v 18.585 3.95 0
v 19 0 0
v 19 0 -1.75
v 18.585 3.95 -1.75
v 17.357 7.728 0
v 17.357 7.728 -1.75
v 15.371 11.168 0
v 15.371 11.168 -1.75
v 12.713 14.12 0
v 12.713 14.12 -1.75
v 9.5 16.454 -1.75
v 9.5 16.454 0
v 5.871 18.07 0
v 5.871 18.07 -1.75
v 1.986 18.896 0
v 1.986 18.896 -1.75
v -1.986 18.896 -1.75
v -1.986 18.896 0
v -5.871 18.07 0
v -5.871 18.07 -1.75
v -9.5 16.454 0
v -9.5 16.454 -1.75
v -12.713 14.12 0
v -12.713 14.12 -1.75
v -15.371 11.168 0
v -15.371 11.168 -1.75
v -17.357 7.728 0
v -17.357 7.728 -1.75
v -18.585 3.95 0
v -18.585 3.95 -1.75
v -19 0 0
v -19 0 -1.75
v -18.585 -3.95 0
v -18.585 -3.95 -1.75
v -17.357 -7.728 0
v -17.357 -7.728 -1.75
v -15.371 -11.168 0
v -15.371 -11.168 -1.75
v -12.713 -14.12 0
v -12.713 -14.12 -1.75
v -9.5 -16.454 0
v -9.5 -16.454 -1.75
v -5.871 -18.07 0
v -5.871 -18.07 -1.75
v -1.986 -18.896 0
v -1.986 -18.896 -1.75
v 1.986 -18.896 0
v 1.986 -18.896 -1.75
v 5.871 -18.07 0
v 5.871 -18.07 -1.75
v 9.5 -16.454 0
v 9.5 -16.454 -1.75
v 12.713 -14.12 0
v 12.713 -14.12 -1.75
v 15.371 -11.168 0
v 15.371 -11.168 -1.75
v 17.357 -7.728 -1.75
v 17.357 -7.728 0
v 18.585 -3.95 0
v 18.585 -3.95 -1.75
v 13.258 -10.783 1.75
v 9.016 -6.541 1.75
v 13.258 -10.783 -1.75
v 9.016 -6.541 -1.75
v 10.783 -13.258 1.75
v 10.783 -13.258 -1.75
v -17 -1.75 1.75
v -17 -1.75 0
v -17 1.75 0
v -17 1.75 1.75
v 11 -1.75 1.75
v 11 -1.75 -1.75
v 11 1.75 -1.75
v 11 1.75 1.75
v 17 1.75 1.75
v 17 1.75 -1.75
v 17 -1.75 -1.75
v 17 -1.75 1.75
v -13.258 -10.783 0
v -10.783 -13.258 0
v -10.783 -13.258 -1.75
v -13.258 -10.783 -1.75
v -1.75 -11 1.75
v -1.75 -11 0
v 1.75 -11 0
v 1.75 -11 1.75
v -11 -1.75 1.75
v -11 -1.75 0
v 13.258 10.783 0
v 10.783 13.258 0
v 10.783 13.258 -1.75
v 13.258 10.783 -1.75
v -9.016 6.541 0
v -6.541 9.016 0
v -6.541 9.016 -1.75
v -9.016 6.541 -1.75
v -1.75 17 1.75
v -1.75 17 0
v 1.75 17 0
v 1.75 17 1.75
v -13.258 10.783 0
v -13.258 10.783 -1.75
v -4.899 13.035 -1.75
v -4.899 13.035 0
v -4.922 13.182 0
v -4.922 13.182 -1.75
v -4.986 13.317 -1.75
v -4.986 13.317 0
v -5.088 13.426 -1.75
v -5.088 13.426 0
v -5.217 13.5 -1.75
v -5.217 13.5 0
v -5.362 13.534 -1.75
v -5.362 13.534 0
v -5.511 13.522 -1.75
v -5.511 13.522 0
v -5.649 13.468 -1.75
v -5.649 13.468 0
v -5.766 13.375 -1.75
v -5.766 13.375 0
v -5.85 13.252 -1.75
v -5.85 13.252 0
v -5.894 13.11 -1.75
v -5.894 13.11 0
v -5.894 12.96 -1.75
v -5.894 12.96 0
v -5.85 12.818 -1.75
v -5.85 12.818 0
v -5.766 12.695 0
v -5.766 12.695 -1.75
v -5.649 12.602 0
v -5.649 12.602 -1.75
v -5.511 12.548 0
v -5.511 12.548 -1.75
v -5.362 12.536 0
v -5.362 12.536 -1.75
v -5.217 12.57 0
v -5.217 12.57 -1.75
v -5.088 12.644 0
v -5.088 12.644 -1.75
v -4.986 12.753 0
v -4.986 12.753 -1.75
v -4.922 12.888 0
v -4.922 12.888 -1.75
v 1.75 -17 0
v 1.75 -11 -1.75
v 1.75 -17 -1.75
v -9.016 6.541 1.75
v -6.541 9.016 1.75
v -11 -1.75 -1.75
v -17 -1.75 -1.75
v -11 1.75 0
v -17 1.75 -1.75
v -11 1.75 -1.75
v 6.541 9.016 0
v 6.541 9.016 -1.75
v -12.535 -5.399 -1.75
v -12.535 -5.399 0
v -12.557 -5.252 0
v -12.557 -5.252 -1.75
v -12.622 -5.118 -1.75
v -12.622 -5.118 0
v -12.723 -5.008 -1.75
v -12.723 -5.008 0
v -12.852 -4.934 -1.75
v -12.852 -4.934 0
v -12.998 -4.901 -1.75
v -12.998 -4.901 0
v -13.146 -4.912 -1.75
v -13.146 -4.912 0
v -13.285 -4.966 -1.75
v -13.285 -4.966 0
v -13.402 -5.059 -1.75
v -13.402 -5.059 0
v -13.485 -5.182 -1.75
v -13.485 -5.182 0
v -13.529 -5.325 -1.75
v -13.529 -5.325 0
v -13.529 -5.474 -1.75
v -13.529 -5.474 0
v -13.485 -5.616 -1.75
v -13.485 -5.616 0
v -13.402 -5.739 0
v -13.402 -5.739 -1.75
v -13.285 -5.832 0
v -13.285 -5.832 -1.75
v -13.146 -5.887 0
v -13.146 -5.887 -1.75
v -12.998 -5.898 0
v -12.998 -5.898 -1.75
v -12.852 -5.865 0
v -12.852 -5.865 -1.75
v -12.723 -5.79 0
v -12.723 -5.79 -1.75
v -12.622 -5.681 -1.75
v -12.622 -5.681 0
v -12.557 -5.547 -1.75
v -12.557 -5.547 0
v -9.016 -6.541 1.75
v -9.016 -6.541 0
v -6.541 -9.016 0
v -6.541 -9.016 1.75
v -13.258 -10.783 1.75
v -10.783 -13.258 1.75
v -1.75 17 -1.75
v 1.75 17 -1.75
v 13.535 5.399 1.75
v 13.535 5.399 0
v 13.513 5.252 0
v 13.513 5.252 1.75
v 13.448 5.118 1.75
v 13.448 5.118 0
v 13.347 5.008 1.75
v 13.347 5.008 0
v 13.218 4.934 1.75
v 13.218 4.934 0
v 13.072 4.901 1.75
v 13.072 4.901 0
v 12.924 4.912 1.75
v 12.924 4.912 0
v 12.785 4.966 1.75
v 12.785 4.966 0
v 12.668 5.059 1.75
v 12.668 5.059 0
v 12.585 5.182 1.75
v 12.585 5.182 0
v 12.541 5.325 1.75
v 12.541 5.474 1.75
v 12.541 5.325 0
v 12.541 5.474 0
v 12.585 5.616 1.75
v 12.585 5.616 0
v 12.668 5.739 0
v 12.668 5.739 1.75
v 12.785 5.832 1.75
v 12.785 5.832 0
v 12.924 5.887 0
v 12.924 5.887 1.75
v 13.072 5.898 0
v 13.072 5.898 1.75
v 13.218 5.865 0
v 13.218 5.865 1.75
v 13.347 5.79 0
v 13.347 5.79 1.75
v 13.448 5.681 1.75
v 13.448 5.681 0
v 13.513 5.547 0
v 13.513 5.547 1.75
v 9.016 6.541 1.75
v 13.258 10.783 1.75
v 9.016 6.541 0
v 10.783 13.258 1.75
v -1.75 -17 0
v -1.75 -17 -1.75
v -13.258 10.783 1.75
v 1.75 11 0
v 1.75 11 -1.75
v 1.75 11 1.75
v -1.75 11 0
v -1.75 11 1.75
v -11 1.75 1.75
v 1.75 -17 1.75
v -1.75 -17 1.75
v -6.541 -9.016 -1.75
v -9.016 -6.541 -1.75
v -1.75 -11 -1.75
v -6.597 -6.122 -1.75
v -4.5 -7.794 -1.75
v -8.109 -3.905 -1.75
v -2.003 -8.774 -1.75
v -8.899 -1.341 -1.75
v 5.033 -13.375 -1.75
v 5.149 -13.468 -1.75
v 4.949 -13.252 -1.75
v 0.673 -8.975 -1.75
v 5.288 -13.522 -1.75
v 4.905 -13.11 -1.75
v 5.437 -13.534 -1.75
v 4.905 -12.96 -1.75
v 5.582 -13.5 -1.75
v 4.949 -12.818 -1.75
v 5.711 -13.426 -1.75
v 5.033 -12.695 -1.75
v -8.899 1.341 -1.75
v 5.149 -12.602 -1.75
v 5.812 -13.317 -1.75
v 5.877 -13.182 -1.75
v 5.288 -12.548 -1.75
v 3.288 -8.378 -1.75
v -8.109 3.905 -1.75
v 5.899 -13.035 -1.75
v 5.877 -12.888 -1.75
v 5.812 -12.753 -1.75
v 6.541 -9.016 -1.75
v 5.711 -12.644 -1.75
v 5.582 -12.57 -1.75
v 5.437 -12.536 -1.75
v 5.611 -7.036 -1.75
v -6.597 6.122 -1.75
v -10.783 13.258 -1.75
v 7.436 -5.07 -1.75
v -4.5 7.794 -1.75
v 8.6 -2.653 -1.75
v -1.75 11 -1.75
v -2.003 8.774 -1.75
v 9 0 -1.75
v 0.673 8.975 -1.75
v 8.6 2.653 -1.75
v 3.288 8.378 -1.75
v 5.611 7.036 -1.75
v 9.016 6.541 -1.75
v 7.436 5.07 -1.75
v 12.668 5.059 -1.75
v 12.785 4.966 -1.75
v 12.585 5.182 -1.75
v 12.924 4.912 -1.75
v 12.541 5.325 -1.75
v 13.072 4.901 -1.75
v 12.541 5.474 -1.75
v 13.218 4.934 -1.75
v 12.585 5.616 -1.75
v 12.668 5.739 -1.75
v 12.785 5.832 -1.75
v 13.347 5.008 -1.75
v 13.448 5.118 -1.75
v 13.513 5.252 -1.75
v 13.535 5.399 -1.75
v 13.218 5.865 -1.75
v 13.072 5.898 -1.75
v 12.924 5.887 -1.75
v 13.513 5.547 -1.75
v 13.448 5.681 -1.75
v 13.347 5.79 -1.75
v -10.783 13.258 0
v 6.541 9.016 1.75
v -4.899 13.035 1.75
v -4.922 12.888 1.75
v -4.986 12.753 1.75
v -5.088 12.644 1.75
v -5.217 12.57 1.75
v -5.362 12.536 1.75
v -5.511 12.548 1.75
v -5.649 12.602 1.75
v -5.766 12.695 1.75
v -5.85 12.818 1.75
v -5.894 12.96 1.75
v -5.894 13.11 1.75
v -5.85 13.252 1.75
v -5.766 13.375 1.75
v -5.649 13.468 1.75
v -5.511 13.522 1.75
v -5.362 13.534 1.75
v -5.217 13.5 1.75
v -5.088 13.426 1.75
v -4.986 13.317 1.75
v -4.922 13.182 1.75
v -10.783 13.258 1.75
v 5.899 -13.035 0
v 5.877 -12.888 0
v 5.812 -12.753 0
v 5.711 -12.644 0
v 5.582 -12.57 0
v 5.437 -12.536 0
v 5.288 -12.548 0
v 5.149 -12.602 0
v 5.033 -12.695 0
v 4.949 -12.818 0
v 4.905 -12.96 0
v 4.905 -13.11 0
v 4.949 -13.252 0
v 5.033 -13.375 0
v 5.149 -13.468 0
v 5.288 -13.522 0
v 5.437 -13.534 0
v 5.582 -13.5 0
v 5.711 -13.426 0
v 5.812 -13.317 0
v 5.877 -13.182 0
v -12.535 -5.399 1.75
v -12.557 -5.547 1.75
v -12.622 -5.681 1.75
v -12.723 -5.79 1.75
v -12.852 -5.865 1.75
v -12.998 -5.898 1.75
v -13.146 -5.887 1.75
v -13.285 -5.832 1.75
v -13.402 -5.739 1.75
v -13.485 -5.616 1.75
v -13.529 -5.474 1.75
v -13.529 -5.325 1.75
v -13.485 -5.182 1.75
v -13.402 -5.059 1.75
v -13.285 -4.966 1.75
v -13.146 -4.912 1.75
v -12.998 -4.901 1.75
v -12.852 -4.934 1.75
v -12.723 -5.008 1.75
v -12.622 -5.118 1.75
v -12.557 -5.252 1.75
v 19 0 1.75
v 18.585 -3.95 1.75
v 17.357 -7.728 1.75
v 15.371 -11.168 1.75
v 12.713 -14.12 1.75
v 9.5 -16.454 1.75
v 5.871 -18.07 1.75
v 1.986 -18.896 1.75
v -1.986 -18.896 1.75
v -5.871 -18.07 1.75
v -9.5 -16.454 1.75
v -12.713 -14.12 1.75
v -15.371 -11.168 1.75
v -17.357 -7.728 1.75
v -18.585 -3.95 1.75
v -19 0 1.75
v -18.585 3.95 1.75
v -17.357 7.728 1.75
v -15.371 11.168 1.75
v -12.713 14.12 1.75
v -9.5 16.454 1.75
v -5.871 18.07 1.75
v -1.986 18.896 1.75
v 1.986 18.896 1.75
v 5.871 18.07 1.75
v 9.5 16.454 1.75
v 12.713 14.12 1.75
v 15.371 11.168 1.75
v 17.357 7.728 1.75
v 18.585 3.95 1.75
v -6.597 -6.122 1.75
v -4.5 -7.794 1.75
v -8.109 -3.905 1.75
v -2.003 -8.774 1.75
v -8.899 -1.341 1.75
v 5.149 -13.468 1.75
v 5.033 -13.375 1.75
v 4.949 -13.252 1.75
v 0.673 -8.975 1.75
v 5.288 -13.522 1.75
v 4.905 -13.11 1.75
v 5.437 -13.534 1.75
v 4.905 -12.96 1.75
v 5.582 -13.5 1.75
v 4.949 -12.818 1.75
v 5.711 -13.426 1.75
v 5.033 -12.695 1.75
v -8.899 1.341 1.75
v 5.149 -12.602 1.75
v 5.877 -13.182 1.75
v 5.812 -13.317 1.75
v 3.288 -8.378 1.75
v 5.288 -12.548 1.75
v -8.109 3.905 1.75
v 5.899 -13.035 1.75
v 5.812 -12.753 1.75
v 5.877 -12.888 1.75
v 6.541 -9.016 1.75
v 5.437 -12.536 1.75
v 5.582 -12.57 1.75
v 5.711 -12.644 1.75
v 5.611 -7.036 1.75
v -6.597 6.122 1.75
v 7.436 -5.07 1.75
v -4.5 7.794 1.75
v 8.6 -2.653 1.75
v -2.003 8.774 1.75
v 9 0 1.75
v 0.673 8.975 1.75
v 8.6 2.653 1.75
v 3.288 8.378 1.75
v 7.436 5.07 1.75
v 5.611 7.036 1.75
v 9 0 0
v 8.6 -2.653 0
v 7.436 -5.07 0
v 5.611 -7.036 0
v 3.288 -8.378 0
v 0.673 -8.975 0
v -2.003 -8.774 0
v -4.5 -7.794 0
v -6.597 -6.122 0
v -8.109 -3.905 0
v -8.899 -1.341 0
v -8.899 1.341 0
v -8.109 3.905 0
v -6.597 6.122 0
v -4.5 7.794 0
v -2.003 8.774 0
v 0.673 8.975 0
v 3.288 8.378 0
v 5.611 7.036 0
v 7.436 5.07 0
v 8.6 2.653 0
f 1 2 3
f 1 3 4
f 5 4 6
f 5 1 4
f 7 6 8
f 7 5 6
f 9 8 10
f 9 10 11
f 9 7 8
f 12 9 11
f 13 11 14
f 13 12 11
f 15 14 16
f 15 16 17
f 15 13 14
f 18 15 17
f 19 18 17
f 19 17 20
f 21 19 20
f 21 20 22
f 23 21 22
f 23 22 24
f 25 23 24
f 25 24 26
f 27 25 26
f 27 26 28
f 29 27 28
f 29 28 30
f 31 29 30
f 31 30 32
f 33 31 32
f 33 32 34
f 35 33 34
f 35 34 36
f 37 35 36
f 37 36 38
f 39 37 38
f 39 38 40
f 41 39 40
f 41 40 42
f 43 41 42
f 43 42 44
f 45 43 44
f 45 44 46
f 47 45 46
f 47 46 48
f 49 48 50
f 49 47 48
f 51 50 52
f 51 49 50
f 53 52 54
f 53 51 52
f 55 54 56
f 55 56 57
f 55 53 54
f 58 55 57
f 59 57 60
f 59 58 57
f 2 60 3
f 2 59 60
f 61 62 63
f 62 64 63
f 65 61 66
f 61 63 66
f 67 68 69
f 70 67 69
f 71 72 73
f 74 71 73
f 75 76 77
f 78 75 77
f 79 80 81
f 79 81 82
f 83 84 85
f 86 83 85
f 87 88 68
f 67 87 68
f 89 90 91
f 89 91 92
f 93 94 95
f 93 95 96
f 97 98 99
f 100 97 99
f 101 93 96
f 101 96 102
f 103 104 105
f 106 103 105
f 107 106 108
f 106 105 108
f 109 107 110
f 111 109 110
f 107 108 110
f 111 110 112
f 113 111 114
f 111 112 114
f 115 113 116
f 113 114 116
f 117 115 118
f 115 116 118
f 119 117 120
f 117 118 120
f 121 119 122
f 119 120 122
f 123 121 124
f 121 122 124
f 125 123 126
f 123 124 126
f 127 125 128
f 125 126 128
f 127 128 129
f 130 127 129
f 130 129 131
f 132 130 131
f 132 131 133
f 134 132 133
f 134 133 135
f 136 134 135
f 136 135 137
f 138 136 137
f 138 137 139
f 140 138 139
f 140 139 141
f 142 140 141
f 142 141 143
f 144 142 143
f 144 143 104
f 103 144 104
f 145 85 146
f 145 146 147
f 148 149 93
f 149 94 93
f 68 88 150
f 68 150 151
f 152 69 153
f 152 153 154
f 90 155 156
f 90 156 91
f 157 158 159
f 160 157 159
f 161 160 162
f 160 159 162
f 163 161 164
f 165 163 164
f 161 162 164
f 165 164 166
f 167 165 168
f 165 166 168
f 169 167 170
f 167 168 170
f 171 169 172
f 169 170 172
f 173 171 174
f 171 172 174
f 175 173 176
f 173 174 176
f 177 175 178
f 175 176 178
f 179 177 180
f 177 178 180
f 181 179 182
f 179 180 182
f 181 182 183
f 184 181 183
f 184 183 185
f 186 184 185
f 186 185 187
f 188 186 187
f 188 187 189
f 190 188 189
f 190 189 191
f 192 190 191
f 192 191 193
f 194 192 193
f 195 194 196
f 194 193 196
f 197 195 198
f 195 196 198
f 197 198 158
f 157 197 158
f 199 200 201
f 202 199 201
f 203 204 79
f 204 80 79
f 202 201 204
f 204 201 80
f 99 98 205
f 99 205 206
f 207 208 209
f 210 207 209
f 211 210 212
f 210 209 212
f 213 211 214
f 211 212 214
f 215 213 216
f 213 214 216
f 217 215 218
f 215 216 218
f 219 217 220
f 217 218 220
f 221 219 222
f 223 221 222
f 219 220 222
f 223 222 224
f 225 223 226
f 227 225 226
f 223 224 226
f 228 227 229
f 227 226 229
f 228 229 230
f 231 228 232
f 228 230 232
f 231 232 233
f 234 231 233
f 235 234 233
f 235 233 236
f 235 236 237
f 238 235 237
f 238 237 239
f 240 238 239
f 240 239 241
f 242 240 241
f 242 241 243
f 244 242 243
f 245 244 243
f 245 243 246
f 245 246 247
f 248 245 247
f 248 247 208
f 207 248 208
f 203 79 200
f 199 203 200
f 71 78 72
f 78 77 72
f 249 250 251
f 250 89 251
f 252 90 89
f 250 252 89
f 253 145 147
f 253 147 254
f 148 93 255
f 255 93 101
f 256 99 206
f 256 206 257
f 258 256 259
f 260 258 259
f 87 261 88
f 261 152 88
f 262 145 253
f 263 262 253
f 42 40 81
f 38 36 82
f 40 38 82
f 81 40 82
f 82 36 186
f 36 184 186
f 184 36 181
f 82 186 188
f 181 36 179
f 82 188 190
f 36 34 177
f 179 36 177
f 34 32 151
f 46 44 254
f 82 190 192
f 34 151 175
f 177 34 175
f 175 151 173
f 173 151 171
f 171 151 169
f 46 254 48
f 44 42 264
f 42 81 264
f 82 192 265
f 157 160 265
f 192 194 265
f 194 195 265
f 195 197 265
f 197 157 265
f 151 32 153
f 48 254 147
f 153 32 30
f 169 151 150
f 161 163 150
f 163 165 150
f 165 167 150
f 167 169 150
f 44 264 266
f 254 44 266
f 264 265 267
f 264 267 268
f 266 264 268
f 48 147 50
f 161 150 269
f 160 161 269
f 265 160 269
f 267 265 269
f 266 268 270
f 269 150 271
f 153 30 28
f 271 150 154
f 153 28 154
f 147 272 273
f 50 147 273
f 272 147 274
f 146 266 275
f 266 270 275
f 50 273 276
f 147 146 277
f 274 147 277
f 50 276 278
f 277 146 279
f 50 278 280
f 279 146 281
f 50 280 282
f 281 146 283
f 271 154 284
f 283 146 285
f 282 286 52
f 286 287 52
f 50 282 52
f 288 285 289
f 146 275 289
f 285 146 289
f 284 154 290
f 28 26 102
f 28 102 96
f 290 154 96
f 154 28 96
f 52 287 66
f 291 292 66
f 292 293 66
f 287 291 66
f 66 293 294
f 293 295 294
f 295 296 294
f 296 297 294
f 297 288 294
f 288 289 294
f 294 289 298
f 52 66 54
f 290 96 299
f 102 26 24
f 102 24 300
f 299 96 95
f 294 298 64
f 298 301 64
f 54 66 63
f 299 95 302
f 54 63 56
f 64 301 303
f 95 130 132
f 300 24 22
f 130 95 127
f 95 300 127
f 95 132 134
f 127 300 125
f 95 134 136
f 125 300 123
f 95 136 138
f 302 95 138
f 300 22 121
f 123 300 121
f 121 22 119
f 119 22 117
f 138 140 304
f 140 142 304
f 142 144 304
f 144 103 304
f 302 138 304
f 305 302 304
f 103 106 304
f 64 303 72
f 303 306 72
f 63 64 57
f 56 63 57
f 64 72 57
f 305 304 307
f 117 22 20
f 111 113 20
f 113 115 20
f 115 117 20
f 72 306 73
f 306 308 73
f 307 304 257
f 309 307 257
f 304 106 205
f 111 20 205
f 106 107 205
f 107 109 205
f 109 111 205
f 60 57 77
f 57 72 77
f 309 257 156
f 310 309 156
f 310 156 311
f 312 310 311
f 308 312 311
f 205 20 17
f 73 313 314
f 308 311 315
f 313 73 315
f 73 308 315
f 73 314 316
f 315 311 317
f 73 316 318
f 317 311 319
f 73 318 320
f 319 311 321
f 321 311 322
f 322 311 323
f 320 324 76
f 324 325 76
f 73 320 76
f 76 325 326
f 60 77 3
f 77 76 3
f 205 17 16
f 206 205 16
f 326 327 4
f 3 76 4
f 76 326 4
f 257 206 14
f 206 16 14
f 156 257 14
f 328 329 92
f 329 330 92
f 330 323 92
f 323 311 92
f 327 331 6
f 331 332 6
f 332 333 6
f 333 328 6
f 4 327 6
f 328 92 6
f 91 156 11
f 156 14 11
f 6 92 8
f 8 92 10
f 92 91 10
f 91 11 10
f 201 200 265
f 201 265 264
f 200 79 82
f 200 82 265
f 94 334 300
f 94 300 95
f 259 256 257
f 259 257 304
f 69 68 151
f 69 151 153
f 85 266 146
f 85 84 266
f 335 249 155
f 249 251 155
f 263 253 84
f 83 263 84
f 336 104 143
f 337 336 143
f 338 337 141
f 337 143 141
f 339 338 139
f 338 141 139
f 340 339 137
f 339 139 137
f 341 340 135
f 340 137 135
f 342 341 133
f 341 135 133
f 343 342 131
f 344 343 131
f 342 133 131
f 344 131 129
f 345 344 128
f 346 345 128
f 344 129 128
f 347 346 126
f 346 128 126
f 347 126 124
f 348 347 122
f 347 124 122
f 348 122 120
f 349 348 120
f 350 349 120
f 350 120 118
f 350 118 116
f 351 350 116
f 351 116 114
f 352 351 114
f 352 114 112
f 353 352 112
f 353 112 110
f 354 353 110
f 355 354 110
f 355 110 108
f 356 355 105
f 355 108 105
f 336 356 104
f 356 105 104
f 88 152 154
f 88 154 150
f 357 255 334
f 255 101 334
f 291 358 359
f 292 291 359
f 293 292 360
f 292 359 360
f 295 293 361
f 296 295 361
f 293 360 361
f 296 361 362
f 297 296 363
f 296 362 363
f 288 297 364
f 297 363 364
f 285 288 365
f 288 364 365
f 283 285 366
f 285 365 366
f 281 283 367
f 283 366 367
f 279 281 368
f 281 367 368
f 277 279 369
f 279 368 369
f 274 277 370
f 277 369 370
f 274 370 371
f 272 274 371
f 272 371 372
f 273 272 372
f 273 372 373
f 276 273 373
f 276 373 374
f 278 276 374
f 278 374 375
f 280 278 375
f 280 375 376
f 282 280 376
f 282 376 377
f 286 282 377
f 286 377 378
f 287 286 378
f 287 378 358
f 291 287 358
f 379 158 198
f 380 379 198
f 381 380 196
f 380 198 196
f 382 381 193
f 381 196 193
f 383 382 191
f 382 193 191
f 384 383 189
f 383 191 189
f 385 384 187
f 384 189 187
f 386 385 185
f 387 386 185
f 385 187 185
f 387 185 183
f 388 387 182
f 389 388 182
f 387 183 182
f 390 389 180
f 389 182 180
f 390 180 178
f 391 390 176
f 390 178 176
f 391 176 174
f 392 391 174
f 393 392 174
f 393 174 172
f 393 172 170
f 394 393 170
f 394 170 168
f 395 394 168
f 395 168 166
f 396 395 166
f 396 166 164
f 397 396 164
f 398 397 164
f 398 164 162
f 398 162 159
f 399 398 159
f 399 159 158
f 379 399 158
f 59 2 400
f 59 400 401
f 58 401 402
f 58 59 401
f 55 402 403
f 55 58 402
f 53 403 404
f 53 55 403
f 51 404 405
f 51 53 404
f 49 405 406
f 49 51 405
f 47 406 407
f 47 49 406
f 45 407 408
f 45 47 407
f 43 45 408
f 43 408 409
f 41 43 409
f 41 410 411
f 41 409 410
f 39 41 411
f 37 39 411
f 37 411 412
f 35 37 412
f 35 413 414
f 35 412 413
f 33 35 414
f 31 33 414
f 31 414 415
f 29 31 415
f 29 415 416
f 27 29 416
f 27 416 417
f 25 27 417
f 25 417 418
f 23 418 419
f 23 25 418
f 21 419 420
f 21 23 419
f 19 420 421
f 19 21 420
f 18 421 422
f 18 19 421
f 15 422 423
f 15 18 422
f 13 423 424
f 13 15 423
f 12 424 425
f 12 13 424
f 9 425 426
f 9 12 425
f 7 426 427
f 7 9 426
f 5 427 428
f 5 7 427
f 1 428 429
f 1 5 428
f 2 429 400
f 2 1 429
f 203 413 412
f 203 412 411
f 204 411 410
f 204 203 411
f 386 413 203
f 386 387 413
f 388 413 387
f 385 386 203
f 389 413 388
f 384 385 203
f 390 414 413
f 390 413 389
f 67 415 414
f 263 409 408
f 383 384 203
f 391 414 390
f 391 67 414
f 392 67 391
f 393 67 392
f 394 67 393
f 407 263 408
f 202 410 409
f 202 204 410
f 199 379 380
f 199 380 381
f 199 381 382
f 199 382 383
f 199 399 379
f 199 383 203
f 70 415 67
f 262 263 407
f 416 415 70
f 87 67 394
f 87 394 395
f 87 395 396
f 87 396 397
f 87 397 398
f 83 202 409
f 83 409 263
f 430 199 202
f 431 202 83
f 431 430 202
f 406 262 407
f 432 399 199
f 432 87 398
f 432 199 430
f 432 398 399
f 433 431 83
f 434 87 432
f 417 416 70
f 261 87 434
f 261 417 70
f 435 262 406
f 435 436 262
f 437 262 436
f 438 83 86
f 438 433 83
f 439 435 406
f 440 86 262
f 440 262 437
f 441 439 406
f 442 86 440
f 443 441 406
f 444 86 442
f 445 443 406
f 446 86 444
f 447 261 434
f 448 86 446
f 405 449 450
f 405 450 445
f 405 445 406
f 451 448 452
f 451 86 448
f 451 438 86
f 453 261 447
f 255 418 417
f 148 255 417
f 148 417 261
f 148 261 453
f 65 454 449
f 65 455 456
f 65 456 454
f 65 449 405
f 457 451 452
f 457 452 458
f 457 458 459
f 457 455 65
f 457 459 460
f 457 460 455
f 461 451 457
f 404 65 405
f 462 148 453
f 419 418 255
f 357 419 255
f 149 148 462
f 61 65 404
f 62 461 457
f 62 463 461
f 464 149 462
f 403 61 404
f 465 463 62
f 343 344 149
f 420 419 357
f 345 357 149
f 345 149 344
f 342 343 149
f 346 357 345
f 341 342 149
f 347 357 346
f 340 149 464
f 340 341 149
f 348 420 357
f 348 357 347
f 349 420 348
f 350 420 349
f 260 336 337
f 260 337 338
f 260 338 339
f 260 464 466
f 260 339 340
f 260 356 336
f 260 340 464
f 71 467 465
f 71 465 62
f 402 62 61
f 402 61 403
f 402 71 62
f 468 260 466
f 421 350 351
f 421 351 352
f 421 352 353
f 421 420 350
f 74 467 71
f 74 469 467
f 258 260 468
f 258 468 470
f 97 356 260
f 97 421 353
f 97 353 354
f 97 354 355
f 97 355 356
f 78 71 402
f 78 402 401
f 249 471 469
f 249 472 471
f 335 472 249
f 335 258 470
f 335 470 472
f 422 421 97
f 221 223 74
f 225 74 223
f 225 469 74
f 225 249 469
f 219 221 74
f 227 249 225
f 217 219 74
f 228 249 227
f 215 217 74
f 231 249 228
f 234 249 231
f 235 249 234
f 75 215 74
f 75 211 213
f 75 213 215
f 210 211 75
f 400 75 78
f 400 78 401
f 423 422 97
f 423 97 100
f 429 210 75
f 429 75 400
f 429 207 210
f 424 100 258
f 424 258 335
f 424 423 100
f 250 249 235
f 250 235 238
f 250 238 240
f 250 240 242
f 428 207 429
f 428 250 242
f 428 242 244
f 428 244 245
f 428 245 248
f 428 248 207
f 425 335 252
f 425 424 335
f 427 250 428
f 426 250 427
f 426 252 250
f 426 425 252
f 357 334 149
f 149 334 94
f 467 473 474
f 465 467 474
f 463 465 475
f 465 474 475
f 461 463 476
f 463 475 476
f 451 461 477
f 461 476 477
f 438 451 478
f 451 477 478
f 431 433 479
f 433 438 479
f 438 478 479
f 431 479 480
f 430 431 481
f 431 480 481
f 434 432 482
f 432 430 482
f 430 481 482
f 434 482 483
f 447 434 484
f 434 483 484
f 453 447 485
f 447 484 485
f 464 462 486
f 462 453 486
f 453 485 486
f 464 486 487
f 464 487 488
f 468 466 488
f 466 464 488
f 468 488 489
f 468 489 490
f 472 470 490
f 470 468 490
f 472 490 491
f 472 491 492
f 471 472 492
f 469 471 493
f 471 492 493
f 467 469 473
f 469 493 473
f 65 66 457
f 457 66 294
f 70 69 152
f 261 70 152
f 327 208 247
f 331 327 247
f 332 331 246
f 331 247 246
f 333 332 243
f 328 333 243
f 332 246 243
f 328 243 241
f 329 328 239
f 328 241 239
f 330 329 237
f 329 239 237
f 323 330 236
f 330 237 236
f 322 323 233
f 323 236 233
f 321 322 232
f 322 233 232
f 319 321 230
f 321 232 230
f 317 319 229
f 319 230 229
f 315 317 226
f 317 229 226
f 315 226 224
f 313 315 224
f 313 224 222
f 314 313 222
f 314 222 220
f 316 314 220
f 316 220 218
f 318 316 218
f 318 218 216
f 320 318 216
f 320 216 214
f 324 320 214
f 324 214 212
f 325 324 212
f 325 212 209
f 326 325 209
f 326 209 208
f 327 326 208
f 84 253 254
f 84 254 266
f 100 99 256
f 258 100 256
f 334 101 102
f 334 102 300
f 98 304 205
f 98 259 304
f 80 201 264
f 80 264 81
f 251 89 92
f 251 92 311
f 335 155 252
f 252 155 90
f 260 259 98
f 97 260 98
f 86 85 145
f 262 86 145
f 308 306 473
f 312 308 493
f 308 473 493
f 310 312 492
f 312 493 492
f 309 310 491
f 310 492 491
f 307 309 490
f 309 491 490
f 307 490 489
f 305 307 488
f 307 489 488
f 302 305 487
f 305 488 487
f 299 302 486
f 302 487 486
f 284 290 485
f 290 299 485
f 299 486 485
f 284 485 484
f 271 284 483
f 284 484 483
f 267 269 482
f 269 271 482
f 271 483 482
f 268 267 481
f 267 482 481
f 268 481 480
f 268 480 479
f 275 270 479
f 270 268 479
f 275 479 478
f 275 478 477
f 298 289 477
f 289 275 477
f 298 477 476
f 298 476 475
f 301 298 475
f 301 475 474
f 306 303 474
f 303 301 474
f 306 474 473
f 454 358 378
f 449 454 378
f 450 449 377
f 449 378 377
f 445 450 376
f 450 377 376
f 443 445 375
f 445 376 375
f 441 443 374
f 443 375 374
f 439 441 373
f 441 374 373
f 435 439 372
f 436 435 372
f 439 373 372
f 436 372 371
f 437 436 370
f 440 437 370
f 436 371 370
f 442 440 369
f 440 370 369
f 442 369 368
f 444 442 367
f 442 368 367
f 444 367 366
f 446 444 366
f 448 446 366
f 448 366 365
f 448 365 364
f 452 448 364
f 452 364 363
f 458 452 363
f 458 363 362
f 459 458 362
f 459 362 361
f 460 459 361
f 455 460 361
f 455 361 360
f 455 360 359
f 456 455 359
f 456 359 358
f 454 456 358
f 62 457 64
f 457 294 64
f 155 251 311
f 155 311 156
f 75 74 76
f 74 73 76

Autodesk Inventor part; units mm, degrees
ref_plane "YZ Plane" through (0, 0, 0) normal (1, 0, 0) x (0, 1, 0)
ref_plane "XZ Plane" through (0, 0, 0) normal (0, 1, 0) x (-1, 0, 0)
ref_plane "XY Plane" through (0, 0, 0) normal (0, 0, 1) x (1, 0, 0)
sketch "Sketch1" plane through (0, 0, 0) normal (0, 0, 1) x (1, 0, 0)
  circle A0 centre (0, 0) radius 11
  circle A1 centre (0, 0) radius 17
  line L0 (11, 1.75) -> (17, 1.75)
  line L1 (17, 1.75) -> (17, -1.75)
  line L2 (17, -1.75) -> (11, -1.75)
  line L3 (11, -1.75) -> (11, 1.75)
  line L4 (13.2583, 10.7834) -> (9.0156, 6.5407)
  line L5 (9.0156, 6.5407) -> (6.5407, 9.0156)
  line L6 (6.5407, 9.0156) -> (10.7834, 13.2583)
  line L7 (10.7834, 13.2583) -> (13.2583, 10.7834)
  line L8 (1.75, 17) -> (1.75, 11)
  line L9 (1.75, 11) -> (-1.75, 11)
  line L10 (-1.75, 11) -> (-1.75, 17)
  line L11 (-1.75, 17) -> (1.75, 17)
  line L12 (-10.7834, 13.2583) -> (-6.5407, 9.0156)
  line L13 (-6.5407, 9.0156) -> (-9.0156, 6.5407)
  line L14 (-9.0156, 6.5407) -> (-13.2583, 10.7834)
  line L15 (-13.2583, 10.7834) -> (-10.7834, 13.2583)
  line L16 (-17, 1.75) -> (-11, 1.75)
  line L17 (-11, 1.75) -> (-11, -1.75)
  line L18 (-11, -1.75) -> (-17, -1.75)
  line L19 (-17, -1.75) -> (-17, 1.75)
  line L20 (-13.2583, -10.7834) -> (-9.0156, -6.5407)
  line L21 (-9.0156, -6.5407) -> (-6.5407, -9.0156)
  line L22 (-6.5407, -9.0156) -> (-10.7834, -13.2583)
  line L23 (-10.7834, -13.2583) -> (-13.2583, -10.7834)
  line L24 (-1.75, -17) -> (-1.75, -11)
  line L25 (-1.75, -11) -> (1.75, -11)
  line L26 (1.75, -11) -> (1.75, -17)
  line L27 (1.75, -17) -> (-1.75, -17)
  line L28 (10.7834, -13.2583) -> (6.5407, -9.0156)
  line L29 (6.5407, -9.0156) -> (9.0156, -6.5407)
  line L30 (9.0156, -6.5407) -> (13.2583, -10.7834)
  line L31 (13.2583, -10.7834) -> (10.7834, -13.2583)
  circle A2 centre (0, 0) radius 9
  circle A3 centre (0, 0) radius 19
  line L32 (-13.035, -5.3993) -> (-5.3993, 13.035)
  line L33 (-5.3993, 13.035) -> (13.035, 5.3993)
  line L34 (13.035, 5.3993) -> (5.3993, -13.035)
  line L35 (5.3993, -13.035) -> (-13.035, -5.3993)
  line L36 (0, 0) -> (-5.3993, 13.035)
  line L37 (0, 0) -> (14.109, 0) construction
  line L38 (0, 0) -> (16.0476, 6.6471)
  line L39 (0, 0) -> (17.3698, 0) construction
  circle A4 centre (-5.3993, 13.035) radius 0.5
  circle A5 centre (13.035, 5.3993) radius 0.5
  circle A6 centre (5.3993, -13.035) radius 0.5
  circle A7 centre (-13.035, -5.3993) radius 0.5
  point P0 (11, 0)
  point P1 (7.7782, 7.7782)
  point P2 (0, 11)
  point P3 (-7.7782, 7.7782)
  point P4 (-11, 0)
  point P5 (-7.7782, -7.7782)
  point P6 (0, -11)
  point P7 (7.7782, -7.7782)
  dimension "d0" = 22
  dimension "d1" = 6
  dimension "d2" = 3.5
  dimension "d3" = 6
  dimension "d6" = 360
  dimension "d8" = 2
  dimension "d9" = 2
  dimension "d23" = 112.5
  dimension "d24" = 22.5
  dimension "d25" = 1
  dimension "d26" = 1
  dimension "d27" = 1
  dimension "d28" = 1
  dimension "d29" = 14.109
  dimension "d30" = 19.9531
  dimension "d31" = 19.9531
extrude "Extrusion1" add sketch "Sketch1" along normal mid plane 3.5 contours A0 L34 | L3 L2 A1 L30 L29 A0 | A0 L34 L3 | L34 A0 L35 L32 L36 A2 L38 | A0 L38 A5 L34 L0 L3 | L29 L34 A0 | L38 A2 L36 A0 L33 | A0 L33 L5 L4 A5 L38 | L34 L29 L28 A6 L35 L26 L25 A0 | L34 A5 L38 A1 L0 | L33 A0 | A0 L5 L33 | L35 L25 A0 | A0 L35 | L28 A1 L26 L35 A6 L34 | A0 L9 L8 A1 L6 L5 | L33 L9 A0 | A0 L36 A4 L33 L10 L9 | L33 L4 A1 L38 A5 | L25 L24 A1 L22 L21 A0 | L35 L21 L20 A7 L32 L18 L17 A0 | A0 L21 L35 | A0 L32 L13 L12 A4 L36 | L32 L17 A0 | A0 L32 | A0 L13 L32 | L33 A4 L32 L12 A1 L10 | L17 L16 A1 L14 L13 A0 | L20 A1 L18 L32 A7 L35 | A3
equation "\"d25\" = d28"
equation "\"d26\" = d28"
equation "\"d27\" = d28"
properties part number "Spodnji obroc"
